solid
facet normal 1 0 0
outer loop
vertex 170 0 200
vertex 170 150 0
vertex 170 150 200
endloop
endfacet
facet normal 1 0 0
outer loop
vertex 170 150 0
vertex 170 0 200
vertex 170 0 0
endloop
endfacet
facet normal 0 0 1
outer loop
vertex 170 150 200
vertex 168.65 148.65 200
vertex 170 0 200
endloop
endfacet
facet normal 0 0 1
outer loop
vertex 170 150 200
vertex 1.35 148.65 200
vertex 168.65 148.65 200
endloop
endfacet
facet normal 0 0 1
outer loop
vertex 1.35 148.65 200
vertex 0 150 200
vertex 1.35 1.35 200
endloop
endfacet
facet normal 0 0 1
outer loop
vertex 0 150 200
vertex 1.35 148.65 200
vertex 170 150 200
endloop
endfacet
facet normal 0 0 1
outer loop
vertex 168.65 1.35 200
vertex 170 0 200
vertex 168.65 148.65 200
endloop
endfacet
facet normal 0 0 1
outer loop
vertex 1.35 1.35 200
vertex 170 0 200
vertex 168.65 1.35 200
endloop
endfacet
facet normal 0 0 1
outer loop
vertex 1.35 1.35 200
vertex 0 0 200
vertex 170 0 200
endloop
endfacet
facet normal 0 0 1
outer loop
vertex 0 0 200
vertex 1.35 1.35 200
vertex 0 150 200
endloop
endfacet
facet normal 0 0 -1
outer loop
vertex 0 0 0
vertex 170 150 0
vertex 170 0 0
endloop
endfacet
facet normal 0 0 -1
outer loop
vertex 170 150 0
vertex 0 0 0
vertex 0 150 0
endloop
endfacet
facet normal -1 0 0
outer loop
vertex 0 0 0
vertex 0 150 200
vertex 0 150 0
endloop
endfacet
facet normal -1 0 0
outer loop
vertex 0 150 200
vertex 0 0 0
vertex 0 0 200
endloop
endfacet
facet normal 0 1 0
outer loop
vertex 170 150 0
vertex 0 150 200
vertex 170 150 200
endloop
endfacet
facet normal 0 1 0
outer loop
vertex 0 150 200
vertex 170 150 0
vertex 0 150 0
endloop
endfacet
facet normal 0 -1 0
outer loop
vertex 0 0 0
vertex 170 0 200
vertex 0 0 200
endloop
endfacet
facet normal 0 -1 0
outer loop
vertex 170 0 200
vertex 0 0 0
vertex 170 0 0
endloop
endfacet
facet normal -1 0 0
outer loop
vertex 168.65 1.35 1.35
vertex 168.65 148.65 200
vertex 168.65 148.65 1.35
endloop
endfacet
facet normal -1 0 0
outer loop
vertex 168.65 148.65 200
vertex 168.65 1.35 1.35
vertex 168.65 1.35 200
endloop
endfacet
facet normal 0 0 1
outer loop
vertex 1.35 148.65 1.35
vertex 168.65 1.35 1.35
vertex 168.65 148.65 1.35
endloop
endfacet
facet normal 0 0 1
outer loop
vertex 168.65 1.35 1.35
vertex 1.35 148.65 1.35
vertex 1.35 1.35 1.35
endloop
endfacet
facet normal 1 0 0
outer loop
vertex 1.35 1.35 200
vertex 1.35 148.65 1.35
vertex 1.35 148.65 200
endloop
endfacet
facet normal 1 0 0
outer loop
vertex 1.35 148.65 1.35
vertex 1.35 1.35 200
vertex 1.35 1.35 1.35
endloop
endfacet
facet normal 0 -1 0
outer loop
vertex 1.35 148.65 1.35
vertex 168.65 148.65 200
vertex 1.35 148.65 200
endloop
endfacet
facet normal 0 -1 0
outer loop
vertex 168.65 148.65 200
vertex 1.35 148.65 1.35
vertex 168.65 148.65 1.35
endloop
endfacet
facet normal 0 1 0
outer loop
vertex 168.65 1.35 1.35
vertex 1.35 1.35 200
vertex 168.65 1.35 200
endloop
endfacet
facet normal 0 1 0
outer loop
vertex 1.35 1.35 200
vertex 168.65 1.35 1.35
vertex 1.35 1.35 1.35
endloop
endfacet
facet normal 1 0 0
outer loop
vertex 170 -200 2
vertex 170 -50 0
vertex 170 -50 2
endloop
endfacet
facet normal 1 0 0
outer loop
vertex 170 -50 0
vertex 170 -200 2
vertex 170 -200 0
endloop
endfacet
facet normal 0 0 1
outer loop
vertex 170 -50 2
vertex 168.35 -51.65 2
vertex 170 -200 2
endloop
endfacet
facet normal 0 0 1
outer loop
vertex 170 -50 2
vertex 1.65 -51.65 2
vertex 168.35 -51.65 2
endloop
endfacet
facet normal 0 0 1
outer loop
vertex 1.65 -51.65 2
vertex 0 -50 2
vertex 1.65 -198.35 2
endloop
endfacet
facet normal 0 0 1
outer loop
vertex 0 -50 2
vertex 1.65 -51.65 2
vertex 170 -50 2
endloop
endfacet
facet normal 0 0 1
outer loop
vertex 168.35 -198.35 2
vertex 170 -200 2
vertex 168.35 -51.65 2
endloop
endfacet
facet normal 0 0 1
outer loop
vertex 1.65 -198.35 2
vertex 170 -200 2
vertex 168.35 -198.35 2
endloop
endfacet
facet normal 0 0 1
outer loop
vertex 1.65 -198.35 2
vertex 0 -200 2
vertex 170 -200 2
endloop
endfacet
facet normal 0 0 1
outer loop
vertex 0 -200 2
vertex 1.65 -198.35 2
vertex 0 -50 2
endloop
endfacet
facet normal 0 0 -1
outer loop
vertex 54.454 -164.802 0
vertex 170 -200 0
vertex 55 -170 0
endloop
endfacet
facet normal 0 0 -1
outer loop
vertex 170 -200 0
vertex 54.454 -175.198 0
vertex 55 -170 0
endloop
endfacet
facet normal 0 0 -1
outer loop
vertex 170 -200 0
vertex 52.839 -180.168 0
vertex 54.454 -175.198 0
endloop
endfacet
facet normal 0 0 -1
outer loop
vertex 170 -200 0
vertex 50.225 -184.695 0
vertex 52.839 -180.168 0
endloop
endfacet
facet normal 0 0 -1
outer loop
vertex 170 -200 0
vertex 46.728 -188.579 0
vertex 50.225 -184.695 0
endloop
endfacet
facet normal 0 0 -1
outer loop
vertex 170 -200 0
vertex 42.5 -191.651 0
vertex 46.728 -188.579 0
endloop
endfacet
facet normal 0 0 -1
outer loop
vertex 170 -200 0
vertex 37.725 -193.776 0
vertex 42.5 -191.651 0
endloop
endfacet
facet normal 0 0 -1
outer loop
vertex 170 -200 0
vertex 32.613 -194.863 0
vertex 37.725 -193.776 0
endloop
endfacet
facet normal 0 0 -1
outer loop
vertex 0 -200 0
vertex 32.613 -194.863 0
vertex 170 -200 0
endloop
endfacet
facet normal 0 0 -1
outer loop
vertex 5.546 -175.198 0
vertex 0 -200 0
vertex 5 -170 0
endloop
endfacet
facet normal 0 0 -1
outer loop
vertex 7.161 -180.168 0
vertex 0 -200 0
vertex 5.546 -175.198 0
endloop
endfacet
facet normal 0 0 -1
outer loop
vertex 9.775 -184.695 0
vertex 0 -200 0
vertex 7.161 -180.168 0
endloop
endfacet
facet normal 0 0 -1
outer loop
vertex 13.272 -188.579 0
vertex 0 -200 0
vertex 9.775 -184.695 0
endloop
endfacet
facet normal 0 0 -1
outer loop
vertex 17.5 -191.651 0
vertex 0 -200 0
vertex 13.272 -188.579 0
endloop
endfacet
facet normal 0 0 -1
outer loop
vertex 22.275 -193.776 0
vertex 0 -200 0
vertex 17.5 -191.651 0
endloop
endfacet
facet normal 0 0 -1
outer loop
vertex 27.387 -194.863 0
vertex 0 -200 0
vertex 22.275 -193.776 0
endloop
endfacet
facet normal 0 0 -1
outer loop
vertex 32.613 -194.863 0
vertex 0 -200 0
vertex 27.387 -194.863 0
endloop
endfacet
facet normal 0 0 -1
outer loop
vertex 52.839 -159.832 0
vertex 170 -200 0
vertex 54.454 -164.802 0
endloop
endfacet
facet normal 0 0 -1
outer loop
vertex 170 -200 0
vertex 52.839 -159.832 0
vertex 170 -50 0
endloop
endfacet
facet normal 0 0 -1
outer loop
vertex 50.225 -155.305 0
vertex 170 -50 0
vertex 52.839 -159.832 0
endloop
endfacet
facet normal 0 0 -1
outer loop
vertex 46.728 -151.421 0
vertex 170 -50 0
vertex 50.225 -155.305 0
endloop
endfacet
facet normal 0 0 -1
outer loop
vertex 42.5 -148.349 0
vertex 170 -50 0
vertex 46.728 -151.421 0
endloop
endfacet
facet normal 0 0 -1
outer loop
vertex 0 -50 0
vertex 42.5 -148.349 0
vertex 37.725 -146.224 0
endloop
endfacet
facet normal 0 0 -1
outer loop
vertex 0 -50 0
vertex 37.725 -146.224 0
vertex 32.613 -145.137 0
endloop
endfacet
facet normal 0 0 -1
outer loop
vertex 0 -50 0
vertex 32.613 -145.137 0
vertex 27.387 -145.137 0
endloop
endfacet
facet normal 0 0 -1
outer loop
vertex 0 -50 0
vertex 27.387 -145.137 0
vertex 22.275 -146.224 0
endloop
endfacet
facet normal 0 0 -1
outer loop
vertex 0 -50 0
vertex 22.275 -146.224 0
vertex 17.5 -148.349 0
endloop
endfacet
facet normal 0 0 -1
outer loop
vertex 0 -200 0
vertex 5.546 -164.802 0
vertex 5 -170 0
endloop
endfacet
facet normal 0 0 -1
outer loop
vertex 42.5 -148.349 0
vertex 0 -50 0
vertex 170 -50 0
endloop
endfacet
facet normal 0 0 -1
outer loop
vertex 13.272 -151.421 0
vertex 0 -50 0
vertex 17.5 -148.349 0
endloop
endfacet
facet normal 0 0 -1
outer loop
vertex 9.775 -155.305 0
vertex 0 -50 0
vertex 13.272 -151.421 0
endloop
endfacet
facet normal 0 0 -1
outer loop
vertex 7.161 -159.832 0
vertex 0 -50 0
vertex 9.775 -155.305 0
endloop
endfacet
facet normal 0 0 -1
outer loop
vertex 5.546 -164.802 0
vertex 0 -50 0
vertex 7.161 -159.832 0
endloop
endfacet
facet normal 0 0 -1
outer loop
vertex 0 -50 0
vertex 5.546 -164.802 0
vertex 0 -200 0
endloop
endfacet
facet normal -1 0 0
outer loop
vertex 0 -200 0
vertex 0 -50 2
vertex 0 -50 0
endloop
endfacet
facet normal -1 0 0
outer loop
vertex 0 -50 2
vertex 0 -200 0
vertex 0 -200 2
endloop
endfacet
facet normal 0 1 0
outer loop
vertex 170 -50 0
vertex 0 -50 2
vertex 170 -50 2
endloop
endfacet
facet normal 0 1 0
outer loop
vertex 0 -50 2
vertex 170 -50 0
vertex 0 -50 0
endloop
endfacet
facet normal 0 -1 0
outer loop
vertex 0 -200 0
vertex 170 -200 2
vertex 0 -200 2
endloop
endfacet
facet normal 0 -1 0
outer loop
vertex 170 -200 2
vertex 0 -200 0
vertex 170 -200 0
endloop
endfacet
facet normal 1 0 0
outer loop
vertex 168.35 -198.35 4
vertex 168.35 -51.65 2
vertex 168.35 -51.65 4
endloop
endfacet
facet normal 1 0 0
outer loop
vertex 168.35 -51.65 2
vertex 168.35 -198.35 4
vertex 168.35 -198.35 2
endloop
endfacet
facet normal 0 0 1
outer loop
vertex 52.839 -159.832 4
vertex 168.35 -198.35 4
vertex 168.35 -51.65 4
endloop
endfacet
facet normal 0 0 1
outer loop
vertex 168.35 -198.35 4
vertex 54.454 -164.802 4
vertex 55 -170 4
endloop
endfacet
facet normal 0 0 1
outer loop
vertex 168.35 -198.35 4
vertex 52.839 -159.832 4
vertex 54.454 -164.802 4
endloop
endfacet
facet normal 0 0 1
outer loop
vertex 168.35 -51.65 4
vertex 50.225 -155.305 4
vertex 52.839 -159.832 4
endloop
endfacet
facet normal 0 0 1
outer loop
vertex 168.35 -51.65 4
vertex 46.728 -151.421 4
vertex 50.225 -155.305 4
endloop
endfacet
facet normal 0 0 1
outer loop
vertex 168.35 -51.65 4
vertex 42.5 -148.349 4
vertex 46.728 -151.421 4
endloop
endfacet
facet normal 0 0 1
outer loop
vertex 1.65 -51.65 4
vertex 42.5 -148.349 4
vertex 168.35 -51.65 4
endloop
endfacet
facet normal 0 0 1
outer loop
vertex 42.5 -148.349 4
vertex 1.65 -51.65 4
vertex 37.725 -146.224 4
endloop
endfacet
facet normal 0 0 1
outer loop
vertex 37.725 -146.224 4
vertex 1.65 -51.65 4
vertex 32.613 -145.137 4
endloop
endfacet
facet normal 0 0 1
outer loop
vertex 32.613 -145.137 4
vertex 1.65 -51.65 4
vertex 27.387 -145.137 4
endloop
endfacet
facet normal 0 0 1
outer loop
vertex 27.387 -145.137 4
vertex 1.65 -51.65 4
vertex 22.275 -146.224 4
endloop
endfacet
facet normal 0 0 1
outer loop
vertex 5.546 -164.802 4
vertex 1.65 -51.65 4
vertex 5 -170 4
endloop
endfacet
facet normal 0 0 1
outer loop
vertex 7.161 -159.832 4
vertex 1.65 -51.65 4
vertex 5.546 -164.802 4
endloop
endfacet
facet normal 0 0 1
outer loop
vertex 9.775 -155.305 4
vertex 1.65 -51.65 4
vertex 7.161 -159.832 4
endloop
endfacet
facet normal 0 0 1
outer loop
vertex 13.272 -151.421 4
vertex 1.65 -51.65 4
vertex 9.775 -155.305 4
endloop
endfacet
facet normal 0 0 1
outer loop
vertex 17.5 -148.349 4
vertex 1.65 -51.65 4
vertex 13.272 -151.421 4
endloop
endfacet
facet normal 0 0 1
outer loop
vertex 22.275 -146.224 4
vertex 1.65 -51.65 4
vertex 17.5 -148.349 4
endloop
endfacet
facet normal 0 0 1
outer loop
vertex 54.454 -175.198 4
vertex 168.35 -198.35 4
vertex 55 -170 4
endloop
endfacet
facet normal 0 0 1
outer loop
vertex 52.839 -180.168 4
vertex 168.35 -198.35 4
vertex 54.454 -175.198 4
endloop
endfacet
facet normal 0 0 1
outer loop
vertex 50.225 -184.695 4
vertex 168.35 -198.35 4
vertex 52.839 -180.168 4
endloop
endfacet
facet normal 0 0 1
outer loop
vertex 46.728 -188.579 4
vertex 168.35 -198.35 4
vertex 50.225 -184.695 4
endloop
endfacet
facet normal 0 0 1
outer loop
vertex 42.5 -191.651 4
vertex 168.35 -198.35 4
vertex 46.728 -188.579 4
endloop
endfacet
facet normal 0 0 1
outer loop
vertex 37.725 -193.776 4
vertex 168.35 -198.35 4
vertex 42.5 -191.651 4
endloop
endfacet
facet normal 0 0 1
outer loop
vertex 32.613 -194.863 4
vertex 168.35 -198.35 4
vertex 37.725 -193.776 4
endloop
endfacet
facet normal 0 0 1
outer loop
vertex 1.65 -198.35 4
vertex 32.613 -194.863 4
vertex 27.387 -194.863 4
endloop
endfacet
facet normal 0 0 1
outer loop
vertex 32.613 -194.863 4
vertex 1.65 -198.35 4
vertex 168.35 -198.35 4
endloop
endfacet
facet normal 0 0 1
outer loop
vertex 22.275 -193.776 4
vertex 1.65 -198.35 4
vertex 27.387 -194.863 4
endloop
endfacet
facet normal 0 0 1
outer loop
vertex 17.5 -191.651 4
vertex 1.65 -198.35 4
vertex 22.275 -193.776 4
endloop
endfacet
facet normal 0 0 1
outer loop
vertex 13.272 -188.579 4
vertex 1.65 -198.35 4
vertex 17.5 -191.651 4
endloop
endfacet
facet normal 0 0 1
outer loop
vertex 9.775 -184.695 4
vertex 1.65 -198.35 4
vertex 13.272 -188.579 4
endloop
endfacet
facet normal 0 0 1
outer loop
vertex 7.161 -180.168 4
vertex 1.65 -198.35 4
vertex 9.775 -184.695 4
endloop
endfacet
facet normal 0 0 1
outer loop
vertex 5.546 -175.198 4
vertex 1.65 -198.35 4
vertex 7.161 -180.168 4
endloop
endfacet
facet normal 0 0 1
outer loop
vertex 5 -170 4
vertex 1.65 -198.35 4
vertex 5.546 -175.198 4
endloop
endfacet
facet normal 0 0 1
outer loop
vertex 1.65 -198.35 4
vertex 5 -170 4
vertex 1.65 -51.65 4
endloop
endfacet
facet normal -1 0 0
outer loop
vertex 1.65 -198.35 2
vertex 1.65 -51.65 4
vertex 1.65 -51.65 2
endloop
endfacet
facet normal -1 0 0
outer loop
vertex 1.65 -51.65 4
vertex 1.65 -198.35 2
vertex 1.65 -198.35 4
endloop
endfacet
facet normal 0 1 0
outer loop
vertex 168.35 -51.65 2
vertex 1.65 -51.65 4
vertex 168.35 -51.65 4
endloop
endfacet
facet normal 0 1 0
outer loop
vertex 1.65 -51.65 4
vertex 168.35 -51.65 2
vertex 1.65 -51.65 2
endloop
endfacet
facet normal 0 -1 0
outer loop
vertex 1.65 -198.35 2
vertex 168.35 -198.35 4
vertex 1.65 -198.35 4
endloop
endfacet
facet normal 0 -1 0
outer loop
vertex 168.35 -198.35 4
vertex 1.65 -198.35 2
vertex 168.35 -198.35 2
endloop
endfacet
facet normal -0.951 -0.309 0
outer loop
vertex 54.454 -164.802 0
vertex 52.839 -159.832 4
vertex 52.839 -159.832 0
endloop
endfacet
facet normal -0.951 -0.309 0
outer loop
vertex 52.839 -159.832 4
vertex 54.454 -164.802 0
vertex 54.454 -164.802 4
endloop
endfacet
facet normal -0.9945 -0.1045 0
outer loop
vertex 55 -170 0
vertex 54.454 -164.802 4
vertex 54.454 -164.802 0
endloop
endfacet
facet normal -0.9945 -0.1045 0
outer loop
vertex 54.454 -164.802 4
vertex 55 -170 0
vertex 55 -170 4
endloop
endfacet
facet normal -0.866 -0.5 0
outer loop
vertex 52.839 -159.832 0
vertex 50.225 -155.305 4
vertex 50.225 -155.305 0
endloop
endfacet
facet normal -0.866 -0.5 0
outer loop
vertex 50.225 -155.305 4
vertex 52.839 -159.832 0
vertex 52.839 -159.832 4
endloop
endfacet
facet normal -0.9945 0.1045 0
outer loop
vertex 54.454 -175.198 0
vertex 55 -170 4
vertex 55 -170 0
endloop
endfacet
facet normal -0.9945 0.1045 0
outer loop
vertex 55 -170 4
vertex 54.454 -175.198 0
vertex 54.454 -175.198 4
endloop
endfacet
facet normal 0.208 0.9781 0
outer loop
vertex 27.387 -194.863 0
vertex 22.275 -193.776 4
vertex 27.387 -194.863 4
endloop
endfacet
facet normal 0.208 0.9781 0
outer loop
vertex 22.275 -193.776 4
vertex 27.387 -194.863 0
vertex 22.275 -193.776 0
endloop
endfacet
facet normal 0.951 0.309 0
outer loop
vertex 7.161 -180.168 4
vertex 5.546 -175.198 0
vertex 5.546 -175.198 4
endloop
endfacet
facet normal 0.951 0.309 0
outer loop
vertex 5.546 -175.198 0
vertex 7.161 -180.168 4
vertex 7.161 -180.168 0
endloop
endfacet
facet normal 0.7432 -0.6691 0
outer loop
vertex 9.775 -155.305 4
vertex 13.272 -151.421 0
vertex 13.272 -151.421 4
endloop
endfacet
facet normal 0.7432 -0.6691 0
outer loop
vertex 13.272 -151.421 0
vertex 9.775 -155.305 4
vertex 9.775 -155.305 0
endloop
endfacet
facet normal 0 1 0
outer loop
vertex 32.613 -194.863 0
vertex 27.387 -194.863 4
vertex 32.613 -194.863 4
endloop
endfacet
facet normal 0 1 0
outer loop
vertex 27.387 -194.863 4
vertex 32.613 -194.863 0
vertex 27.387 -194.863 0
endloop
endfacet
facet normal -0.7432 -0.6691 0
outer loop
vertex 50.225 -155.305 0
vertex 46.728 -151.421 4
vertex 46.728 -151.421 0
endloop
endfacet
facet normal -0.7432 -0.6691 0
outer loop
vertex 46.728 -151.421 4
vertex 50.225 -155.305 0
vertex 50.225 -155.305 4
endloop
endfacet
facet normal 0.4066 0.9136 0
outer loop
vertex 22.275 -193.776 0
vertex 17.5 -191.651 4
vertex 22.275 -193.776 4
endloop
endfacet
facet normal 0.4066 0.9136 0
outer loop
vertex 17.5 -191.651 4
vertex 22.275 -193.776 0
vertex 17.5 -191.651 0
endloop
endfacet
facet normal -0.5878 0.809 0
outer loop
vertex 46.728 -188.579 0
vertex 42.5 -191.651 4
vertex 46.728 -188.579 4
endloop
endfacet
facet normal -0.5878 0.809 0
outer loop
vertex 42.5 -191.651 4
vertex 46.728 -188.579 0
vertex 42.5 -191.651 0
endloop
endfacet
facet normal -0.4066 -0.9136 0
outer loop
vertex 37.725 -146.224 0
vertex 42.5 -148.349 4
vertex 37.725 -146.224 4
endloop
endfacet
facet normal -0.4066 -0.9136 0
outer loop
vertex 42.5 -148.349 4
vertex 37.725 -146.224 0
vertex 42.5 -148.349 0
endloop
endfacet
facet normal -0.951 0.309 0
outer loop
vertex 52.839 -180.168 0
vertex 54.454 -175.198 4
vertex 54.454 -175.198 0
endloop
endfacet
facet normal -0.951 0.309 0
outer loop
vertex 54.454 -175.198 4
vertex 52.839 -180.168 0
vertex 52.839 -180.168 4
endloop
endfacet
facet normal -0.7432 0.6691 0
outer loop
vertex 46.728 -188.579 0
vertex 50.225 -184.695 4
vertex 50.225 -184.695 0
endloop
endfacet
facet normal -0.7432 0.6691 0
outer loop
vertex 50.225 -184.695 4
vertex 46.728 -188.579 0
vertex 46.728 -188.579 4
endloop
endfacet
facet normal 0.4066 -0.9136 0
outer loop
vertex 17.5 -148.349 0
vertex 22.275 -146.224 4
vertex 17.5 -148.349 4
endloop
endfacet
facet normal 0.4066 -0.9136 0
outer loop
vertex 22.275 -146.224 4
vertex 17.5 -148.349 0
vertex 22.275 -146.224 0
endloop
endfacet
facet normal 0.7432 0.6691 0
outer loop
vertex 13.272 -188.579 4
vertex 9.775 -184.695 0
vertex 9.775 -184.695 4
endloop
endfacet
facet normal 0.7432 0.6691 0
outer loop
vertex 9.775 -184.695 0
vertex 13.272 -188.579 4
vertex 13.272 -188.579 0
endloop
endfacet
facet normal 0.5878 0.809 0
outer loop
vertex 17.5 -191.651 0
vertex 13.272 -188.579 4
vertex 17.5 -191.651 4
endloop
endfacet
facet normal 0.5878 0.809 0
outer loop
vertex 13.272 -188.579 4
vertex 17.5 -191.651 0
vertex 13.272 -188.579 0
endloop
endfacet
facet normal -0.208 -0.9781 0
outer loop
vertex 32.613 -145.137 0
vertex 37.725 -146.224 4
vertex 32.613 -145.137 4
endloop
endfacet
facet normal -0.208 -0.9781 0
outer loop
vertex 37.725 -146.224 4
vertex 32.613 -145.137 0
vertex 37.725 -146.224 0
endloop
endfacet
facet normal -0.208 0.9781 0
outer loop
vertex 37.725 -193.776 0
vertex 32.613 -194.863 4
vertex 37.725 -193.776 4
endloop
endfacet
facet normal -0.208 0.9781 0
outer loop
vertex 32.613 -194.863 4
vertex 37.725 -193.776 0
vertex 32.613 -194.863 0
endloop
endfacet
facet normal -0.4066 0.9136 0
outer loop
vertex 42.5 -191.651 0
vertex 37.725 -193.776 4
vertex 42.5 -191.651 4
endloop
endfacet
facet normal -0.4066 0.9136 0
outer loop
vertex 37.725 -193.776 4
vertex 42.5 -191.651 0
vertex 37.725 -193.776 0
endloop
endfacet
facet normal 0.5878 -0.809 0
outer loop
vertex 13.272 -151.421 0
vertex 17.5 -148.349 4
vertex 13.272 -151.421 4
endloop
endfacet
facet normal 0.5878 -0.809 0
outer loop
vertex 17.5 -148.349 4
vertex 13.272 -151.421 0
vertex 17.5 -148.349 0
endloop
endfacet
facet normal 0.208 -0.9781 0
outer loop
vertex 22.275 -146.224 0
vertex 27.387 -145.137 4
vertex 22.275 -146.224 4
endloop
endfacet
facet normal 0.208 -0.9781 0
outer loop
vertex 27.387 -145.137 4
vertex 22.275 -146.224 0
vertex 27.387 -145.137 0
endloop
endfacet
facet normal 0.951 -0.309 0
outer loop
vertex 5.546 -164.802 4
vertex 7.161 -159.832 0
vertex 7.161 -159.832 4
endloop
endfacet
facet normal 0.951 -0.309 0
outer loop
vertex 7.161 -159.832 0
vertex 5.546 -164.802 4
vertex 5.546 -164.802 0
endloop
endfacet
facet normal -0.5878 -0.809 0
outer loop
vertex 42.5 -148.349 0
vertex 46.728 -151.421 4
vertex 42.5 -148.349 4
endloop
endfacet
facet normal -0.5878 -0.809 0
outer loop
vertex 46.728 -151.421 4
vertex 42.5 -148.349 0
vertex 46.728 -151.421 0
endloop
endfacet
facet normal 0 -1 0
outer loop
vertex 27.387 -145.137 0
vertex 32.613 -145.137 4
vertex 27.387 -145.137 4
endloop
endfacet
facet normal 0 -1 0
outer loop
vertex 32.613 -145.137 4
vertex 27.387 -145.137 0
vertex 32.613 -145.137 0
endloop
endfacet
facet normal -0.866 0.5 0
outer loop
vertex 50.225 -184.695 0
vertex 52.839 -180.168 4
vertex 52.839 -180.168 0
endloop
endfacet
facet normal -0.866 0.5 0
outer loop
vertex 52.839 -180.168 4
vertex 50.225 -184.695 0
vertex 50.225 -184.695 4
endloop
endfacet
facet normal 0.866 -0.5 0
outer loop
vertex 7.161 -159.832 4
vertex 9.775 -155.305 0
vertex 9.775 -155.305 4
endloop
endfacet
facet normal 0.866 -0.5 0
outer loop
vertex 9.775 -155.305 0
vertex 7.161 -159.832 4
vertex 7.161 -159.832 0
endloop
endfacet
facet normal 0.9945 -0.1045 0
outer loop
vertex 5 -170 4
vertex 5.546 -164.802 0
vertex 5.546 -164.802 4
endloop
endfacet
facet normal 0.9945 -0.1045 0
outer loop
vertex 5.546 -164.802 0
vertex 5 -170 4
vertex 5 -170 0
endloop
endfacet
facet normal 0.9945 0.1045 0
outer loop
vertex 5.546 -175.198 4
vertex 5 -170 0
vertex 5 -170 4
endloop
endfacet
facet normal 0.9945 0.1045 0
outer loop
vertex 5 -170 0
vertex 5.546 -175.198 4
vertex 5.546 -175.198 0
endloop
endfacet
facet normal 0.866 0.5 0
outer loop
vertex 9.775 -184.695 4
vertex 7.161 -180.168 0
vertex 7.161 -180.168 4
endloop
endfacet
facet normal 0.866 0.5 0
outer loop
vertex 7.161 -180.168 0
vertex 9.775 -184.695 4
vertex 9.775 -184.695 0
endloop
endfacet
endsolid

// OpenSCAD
wall_width=.45*3;
lid_tol=.3;
difference() {
    cube([170,150,200]);
    translate([wall_width,wall_width,wall_width]) cube([170-wall_width*2,150-wall_width*2,600]);
}
//translate([wall_width,wall_width,0]) rotate([0,0,-135]) wedge();
//wedge();
module wedge() {
    intersection() {
        translate([-50,-100,0]) difference() {
            cube([50,200,10]);
            rotate([0,-atan(.2),0]) cube([60,200,10]);
        }
        translate([0,0,0]) rotate([0,0,135]) cube([100,100,50]);
    }
}

translate([0,-200,0]) {
    difference() {
        union() {
            cube([170,150,2]);
            echo(150-wall_width*2-lid_tol*2);
            echo(170-wall_width*2-lid_tol*2);
            translate([wall_width+lid_tol,wall_width+lid_tol,0]) cube([170-wall_width*2-lid_tol*2,150-wall_width*2-lid_tol*2,4]);
        }
        translate([30,30,0]) cylinder(d=50,h=10);
    }
}
